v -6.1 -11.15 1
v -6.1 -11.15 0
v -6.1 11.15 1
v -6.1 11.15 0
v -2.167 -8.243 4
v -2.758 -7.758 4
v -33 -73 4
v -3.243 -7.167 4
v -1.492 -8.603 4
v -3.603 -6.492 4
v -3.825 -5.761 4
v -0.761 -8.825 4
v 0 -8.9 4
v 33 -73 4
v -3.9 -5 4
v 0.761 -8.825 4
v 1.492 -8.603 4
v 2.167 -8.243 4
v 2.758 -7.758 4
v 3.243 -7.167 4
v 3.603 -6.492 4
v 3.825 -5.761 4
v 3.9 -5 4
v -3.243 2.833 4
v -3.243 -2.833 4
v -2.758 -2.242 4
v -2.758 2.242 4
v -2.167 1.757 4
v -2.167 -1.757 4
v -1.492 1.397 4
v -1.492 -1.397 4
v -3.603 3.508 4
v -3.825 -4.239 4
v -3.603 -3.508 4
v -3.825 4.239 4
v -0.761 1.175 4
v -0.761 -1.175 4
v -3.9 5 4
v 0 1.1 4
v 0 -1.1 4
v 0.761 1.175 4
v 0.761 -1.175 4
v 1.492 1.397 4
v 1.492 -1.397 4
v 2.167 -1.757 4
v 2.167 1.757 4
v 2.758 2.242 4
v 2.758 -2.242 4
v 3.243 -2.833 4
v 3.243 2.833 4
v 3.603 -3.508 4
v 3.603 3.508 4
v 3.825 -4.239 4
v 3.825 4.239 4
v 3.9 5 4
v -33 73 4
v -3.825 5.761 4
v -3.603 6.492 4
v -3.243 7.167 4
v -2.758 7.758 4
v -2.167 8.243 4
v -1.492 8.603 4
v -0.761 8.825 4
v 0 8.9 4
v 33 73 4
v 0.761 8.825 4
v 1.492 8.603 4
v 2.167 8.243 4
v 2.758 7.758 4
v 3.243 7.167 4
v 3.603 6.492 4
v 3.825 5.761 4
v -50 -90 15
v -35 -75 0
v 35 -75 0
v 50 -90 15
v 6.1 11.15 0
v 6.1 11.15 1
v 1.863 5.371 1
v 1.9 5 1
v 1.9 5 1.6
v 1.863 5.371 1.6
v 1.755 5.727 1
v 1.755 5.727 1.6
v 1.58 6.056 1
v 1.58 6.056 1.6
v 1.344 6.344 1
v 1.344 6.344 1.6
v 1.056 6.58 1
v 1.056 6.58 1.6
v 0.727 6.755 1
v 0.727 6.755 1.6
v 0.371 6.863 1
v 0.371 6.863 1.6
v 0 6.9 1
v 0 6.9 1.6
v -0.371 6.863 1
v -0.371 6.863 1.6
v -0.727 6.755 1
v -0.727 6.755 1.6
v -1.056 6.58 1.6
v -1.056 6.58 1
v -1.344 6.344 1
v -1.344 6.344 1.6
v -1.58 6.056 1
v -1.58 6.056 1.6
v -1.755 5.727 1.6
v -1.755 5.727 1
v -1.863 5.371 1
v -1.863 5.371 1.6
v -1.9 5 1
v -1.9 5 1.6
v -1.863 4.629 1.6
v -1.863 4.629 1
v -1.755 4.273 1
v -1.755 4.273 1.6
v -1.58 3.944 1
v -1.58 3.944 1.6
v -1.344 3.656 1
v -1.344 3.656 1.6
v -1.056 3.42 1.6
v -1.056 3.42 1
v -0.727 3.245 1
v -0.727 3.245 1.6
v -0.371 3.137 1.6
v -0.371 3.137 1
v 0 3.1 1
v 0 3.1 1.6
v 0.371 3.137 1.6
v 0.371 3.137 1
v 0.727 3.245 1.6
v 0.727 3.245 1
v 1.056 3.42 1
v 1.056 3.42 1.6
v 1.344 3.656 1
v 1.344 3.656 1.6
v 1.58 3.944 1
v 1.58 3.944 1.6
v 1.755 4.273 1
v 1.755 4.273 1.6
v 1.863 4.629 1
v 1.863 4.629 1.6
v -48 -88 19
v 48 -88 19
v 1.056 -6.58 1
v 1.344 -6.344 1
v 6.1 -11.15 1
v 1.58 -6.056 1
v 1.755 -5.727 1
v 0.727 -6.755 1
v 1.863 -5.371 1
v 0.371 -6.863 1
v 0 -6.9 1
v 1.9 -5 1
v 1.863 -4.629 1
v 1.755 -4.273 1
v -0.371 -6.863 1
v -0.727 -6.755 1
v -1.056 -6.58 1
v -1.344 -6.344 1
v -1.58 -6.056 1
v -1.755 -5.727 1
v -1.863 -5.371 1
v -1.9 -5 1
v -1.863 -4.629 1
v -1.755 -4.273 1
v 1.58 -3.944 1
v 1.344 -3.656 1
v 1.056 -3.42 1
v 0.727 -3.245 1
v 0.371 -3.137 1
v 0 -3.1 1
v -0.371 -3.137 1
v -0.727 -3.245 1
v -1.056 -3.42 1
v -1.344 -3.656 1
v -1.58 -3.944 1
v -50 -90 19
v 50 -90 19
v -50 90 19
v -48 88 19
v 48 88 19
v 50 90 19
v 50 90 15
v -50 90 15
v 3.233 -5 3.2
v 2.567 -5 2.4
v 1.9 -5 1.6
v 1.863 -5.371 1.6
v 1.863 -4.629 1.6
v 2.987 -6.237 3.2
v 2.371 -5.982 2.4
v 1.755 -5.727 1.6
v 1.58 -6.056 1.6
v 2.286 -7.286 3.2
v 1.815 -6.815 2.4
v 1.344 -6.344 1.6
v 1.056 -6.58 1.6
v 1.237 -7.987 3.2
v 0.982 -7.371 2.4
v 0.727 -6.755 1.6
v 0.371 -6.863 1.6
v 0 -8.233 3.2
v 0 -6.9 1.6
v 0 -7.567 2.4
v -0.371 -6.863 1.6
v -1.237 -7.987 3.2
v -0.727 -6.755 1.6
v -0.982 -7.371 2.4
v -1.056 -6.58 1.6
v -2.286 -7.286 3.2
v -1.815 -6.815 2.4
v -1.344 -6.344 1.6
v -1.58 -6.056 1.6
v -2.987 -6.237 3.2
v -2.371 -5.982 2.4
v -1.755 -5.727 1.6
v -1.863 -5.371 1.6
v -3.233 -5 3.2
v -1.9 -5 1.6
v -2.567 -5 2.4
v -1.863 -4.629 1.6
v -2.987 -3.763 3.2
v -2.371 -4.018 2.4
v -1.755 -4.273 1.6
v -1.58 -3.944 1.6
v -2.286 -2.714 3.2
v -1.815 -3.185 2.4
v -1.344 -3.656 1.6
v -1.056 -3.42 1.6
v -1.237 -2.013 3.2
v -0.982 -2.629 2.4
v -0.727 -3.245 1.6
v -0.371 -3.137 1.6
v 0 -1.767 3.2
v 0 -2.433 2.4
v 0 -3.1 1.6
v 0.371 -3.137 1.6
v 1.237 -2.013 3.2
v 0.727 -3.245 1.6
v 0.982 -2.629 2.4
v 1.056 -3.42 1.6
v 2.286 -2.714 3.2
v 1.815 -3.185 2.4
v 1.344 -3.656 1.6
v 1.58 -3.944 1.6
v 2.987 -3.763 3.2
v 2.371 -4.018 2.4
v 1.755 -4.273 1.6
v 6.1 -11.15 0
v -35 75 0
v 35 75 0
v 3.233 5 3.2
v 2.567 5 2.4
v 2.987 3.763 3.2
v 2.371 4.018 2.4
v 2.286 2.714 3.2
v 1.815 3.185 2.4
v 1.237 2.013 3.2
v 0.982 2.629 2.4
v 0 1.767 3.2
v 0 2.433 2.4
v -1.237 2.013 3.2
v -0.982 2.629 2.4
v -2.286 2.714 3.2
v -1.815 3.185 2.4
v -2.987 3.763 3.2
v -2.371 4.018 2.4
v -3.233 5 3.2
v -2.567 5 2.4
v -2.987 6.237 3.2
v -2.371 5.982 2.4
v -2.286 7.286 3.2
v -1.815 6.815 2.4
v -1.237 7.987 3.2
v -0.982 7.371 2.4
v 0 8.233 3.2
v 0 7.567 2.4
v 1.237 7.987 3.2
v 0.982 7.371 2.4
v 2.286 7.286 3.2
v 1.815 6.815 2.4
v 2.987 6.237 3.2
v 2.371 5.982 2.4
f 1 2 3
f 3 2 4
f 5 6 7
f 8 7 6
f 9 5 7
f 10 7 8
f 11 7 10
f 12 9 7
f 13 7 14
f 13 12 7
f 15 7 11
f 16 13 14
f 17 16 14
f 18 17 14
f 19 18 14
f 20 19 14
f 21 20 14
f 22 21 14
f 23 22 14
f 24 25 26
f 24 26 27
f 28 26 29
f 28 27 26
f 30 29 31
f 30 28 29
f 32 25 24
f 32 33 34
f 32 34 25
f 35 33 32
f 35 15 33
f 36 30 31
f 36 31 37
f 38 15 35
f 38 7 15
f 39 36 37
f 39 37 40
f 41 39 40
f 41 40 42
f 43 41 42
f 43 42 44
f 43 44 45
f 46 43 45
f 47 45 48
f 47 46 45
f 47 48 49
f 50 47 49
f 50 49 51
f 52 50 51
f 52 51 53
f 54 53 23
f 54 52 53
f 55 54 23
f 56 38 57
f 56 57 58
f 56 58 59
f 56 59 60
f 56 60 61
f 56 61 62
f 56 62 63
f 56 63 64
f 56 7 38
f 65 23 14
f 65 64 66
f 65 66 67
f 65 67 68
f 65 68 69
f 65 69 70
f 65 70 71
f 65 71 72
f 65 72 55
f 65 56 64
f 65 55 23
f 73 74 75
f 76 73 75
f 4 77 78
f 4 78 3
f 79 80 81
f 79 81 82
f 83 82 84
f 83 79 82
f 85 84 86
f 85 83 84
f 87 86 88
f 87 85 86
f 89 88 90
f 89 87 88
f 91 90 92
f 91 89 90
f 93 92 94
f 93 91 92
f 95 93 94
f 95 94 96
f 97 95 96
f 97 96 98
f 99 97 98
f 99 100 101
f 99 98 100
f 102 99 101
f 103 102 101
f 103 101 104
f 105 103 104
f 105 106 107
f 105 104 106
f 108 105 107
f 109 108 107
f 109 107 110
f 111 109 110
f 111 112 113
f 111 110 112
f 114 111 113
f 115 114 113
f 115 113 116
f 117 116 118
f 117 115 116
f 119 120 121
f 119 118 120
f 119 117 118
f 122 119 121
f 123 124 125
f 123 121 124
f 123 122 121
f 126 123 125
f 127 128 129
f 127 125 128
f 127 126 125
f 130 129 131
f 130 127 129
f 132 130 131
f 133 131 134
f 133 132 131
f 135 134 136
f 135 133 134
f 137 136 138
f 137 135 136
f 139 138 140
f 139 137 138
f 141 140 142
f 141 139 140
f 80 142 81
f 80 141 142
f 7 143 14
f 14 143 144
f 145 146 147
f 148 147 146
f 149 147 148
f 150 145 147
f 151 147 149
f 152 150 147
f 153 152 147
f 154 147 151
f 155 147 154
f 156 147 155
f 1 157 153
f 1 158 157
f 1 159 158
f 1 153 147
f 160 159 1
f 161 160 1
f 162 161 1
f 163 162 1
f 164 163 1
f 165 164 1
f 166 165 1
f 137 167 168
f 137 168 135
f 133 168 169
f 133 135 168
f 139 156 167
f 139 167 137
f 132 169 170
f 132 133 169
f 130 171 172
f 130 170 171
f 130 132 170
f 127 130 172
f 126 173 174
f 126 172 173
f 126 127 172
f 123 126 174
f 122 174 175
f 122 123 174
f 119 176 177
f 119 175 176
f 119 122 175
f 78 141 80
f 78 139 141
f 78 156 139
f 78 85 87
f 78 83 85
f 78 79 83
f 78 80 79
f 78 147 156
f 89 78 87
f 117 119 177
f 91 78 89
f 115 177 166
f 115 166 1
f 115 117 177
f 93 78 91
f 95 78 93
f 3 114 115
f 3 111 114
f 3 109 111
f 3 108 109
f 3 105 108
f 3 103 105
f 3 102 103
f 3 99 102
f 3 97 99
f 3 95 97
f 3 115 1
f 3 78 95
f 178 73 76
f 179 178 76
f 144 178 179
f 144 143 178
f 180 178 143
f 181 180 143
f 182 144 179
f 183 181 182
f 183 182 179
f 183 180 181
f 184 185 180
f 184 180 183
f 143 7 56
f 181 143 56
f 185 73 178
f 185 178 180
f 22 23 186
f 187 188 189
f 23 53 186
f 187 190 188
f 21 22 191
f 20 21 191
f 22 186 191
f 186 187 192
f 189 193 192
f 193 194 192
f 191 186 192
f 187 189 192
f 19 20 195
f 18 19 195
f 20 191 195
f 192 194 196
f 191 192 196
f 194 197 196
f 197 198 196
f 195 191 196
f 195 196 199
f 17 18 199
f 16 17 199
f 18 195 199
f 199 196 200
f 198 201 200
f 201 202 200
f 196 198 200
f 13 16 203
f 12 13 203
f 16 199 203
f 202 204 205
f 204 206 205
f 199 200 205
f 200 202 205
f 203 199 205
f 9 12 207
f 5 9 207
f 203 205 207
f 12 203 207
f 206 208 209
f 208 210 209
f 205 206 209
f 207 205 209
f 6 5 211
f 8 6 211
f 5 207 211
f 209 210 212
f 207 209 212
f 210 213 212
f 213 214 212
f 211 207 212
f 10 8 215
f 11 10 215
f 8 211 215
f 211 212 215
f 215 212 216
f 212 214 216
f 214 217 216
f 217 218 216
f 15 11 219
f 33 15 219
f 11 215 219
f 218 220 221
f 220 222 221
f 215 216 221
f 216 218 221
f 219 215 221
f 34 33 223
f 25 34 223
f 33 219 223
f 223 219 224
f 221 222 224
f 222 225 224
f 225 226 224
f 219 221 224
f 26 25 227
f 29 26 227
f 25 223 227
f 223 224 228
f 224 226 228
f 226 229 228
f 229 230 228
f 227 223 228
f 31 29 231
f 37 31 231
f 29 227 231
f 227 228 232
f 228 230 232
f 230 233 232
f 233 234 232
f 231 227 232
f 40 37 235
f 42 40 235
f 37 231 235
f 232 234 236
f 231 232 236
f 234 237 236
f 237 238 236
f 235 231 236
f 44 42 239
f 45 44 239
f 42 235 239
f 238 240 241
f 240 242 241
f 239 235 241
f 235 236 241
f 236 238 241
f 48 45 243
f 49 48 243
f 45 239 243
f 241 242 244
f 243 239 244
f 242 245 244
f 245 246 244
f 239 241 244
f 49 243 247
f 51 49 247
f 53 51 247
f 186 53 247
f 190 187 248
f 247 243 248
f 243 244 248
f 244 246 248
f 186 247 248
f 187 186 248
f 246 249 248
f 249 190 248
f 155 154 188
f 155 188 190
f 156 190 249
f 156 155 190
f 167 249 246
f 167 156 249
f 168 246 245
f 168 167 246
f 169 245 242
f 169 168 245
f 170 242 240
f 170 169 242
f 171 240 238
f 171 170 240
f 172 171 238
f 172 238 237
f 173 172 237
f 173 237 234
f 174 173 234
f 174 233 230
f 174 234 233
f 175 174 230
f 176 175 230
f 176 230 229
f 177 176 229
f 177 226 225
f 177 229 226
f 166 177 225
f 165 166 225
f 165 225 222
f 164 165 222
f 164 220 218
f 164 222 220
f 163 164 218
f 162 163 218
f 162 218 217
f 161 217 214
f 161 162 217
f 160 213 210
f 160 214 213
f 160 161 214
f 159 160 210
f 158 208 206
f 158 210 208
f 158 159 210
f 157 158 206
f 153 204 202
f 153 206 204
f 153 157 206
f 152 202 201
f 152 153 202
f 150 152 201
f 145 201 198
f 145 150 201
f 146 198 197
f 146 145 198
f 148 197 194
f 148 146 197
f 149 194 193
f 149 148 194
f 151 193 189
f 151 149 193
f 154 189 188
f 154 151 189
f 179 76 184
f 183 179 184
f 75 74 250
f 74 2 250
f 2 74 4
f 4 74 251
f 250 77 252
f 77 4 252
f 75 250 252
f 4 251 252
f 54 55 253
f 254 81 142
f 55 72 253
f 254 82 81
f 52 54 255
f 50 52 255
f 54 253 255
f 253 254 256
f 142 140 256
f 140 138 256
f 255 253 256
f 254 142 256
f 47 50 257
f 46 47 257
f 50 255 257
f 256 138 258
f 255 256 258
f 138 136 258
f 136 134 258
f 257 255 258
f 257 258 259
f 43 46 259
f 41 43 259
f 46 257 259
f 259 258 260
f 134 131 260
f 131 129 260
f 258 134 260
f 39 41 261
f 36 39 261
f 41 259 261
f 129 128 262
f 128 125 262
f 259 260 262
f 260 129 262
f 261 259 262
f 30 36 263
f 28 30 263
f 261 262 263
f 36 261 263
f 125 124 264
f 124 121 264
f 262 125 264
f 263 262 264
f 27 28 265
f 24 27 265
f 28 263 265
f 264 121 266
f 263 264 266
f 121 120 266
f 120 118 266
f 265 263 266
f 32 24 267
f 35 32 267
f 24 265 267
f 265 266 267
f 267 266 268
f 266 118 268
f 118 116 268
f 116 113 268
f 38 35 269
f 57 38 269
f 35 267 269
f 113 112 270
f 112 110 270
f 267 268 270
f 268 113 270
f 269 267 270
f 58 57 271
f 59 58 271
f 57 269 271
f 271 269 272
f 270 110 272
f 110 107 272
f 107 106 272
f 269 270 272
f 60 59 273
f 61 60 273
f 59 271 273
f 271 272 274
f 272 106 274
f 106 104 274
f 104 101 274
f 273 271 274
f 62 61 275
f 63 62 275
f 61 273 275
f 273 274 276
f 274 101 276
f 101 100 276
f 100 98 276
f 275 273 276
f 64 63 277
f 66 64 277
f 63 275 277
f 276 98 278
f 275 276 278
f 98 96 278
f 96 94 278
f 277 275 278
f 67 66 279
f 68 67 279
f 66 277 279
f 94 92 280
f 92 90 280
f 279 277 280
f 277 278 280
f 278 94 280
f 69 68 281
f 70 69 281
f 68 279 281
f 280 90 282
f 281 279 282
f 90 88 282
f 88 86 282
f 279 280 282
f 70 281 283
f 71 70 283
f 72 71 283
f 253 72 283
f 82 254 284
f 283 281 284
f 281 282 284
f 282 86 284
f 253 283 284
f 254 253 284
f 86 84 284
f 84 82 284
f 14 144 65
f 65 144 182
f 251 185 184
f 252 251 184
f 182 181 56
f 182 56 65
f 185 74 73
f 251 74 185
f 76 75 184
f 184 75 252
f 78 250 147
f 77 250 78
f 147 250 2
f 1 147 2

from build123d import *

# Parameters (mm, degrees)
SKETCH_1_W               = 100
SKETCH_1_H               = 180
EXTRUDE_1_DEPTH          = 4
SKETCH_4_W               = 100
SKETCH_4_H               = 180
SKETCH_4_W_2             = 96
SKETCH_4_H_2             = 176
EXTRUDE_3_DEPTH          = 15
CHAMFER_1_SIZE           = 15
CUT_EXTRUDE_3_DEPTH      = 10
CUT_EXTRUDE_3_DEPTH_BACK = 105.694794522
SKETCH_6_R               = 1.9
CHAMFER_2_SIZE           = 2
CHAMFER_2_SIZE2          = 2.4
SKETCH_10_W              = 12.2
SKETCH_10_H              = 22.3
CUT_EXTRUDE_4_DEPTH      = 1


with BuildPart() as part:
    # 스케치1 → 보스-돌출1 (new body)
    with BuildSketch(Plane.XY):
        Rectangle(SKETCH_1_W, SKETCH_1_H)
    extrude(amount=EXTRUDE_1_DEPTH)

    # 스케치4 → 보스-돌출3 (add)
    with BuildSketch(Plane.XY.offset(4)):
        Rectangle(SKETCH_4_W, SKETCH_4_H)
        Rectangle(SKETCH_4_W_2, SKETCH_4_H_2, mode=Mode.SUBTRACT)
    extrude(amount=EXTRUDE_3_DEPTH)

    # 모따기1
    chamfer_1_edges = [part.edges().sort_by_distance(p)[0] for p in [
        (-48, 0, 4),
        (0, -88, 4),
        (50, 0, 0),
        (0, 90, 0),
        (-50, 0, 0),
        (0, -90, 0),
        (48, 0, 4),
        (0, 88, 4),
    ]]
    chamfer(chamfer_1_edges, length=CHAMFER_1_SIZE - 0.0001)  # a hair under: the kernel refuses the full size

    # 스케치6 → 컷-돌출3 (cut, two sides: drawn at the far end of the back side and taken through both)
    with BuildSketch(Plane.XY.offset(-CUT_EXTRUDE_3_DEPTH_BACK)):
        with Locations((0, 5)):
            Circle(SKETCH_6_R)
        with Locations((0, -5)):
            Circle(SKETCH_6_R)
    extrude(amount=CUT_EXTRUDE_3_DEPTH + CUT_EXTRUDE_3_DEPTH_BACK, mode=Mode.SUBTRACT)

    # 모따기2
    chamfer_2_edges = [part.edges().sort_by_distance(p)[0] for p in [
        (-1.9, 5, 4),
        (-1.9, -5, 4),
    ]]
    chamfer_2_side = [part.faces().sort_by_distance(p)[0] for p in [
        (0, 0, 4),
    ]]
    chamfer(chamfer_2_edges, length=CHAMFER_2_SIZE, length2=CHAMFER_2_SIZE2, reference=chamfer_2_side[0])

    # 스케치10 → 컷-돌출4 (cut)
    with BuildSketch(Plane(origin=(0, 0, 0), x_dir=(-1, 0, 0), z_dir=(0, 0, -1))):
        Rectangle(SKETCH_10_W, SKETCH_10_H)
    extrude(amount=-CUT_EXTRUDE_4_DEPTH, mode=Mode.SUBTRACT)


solid = part.part
